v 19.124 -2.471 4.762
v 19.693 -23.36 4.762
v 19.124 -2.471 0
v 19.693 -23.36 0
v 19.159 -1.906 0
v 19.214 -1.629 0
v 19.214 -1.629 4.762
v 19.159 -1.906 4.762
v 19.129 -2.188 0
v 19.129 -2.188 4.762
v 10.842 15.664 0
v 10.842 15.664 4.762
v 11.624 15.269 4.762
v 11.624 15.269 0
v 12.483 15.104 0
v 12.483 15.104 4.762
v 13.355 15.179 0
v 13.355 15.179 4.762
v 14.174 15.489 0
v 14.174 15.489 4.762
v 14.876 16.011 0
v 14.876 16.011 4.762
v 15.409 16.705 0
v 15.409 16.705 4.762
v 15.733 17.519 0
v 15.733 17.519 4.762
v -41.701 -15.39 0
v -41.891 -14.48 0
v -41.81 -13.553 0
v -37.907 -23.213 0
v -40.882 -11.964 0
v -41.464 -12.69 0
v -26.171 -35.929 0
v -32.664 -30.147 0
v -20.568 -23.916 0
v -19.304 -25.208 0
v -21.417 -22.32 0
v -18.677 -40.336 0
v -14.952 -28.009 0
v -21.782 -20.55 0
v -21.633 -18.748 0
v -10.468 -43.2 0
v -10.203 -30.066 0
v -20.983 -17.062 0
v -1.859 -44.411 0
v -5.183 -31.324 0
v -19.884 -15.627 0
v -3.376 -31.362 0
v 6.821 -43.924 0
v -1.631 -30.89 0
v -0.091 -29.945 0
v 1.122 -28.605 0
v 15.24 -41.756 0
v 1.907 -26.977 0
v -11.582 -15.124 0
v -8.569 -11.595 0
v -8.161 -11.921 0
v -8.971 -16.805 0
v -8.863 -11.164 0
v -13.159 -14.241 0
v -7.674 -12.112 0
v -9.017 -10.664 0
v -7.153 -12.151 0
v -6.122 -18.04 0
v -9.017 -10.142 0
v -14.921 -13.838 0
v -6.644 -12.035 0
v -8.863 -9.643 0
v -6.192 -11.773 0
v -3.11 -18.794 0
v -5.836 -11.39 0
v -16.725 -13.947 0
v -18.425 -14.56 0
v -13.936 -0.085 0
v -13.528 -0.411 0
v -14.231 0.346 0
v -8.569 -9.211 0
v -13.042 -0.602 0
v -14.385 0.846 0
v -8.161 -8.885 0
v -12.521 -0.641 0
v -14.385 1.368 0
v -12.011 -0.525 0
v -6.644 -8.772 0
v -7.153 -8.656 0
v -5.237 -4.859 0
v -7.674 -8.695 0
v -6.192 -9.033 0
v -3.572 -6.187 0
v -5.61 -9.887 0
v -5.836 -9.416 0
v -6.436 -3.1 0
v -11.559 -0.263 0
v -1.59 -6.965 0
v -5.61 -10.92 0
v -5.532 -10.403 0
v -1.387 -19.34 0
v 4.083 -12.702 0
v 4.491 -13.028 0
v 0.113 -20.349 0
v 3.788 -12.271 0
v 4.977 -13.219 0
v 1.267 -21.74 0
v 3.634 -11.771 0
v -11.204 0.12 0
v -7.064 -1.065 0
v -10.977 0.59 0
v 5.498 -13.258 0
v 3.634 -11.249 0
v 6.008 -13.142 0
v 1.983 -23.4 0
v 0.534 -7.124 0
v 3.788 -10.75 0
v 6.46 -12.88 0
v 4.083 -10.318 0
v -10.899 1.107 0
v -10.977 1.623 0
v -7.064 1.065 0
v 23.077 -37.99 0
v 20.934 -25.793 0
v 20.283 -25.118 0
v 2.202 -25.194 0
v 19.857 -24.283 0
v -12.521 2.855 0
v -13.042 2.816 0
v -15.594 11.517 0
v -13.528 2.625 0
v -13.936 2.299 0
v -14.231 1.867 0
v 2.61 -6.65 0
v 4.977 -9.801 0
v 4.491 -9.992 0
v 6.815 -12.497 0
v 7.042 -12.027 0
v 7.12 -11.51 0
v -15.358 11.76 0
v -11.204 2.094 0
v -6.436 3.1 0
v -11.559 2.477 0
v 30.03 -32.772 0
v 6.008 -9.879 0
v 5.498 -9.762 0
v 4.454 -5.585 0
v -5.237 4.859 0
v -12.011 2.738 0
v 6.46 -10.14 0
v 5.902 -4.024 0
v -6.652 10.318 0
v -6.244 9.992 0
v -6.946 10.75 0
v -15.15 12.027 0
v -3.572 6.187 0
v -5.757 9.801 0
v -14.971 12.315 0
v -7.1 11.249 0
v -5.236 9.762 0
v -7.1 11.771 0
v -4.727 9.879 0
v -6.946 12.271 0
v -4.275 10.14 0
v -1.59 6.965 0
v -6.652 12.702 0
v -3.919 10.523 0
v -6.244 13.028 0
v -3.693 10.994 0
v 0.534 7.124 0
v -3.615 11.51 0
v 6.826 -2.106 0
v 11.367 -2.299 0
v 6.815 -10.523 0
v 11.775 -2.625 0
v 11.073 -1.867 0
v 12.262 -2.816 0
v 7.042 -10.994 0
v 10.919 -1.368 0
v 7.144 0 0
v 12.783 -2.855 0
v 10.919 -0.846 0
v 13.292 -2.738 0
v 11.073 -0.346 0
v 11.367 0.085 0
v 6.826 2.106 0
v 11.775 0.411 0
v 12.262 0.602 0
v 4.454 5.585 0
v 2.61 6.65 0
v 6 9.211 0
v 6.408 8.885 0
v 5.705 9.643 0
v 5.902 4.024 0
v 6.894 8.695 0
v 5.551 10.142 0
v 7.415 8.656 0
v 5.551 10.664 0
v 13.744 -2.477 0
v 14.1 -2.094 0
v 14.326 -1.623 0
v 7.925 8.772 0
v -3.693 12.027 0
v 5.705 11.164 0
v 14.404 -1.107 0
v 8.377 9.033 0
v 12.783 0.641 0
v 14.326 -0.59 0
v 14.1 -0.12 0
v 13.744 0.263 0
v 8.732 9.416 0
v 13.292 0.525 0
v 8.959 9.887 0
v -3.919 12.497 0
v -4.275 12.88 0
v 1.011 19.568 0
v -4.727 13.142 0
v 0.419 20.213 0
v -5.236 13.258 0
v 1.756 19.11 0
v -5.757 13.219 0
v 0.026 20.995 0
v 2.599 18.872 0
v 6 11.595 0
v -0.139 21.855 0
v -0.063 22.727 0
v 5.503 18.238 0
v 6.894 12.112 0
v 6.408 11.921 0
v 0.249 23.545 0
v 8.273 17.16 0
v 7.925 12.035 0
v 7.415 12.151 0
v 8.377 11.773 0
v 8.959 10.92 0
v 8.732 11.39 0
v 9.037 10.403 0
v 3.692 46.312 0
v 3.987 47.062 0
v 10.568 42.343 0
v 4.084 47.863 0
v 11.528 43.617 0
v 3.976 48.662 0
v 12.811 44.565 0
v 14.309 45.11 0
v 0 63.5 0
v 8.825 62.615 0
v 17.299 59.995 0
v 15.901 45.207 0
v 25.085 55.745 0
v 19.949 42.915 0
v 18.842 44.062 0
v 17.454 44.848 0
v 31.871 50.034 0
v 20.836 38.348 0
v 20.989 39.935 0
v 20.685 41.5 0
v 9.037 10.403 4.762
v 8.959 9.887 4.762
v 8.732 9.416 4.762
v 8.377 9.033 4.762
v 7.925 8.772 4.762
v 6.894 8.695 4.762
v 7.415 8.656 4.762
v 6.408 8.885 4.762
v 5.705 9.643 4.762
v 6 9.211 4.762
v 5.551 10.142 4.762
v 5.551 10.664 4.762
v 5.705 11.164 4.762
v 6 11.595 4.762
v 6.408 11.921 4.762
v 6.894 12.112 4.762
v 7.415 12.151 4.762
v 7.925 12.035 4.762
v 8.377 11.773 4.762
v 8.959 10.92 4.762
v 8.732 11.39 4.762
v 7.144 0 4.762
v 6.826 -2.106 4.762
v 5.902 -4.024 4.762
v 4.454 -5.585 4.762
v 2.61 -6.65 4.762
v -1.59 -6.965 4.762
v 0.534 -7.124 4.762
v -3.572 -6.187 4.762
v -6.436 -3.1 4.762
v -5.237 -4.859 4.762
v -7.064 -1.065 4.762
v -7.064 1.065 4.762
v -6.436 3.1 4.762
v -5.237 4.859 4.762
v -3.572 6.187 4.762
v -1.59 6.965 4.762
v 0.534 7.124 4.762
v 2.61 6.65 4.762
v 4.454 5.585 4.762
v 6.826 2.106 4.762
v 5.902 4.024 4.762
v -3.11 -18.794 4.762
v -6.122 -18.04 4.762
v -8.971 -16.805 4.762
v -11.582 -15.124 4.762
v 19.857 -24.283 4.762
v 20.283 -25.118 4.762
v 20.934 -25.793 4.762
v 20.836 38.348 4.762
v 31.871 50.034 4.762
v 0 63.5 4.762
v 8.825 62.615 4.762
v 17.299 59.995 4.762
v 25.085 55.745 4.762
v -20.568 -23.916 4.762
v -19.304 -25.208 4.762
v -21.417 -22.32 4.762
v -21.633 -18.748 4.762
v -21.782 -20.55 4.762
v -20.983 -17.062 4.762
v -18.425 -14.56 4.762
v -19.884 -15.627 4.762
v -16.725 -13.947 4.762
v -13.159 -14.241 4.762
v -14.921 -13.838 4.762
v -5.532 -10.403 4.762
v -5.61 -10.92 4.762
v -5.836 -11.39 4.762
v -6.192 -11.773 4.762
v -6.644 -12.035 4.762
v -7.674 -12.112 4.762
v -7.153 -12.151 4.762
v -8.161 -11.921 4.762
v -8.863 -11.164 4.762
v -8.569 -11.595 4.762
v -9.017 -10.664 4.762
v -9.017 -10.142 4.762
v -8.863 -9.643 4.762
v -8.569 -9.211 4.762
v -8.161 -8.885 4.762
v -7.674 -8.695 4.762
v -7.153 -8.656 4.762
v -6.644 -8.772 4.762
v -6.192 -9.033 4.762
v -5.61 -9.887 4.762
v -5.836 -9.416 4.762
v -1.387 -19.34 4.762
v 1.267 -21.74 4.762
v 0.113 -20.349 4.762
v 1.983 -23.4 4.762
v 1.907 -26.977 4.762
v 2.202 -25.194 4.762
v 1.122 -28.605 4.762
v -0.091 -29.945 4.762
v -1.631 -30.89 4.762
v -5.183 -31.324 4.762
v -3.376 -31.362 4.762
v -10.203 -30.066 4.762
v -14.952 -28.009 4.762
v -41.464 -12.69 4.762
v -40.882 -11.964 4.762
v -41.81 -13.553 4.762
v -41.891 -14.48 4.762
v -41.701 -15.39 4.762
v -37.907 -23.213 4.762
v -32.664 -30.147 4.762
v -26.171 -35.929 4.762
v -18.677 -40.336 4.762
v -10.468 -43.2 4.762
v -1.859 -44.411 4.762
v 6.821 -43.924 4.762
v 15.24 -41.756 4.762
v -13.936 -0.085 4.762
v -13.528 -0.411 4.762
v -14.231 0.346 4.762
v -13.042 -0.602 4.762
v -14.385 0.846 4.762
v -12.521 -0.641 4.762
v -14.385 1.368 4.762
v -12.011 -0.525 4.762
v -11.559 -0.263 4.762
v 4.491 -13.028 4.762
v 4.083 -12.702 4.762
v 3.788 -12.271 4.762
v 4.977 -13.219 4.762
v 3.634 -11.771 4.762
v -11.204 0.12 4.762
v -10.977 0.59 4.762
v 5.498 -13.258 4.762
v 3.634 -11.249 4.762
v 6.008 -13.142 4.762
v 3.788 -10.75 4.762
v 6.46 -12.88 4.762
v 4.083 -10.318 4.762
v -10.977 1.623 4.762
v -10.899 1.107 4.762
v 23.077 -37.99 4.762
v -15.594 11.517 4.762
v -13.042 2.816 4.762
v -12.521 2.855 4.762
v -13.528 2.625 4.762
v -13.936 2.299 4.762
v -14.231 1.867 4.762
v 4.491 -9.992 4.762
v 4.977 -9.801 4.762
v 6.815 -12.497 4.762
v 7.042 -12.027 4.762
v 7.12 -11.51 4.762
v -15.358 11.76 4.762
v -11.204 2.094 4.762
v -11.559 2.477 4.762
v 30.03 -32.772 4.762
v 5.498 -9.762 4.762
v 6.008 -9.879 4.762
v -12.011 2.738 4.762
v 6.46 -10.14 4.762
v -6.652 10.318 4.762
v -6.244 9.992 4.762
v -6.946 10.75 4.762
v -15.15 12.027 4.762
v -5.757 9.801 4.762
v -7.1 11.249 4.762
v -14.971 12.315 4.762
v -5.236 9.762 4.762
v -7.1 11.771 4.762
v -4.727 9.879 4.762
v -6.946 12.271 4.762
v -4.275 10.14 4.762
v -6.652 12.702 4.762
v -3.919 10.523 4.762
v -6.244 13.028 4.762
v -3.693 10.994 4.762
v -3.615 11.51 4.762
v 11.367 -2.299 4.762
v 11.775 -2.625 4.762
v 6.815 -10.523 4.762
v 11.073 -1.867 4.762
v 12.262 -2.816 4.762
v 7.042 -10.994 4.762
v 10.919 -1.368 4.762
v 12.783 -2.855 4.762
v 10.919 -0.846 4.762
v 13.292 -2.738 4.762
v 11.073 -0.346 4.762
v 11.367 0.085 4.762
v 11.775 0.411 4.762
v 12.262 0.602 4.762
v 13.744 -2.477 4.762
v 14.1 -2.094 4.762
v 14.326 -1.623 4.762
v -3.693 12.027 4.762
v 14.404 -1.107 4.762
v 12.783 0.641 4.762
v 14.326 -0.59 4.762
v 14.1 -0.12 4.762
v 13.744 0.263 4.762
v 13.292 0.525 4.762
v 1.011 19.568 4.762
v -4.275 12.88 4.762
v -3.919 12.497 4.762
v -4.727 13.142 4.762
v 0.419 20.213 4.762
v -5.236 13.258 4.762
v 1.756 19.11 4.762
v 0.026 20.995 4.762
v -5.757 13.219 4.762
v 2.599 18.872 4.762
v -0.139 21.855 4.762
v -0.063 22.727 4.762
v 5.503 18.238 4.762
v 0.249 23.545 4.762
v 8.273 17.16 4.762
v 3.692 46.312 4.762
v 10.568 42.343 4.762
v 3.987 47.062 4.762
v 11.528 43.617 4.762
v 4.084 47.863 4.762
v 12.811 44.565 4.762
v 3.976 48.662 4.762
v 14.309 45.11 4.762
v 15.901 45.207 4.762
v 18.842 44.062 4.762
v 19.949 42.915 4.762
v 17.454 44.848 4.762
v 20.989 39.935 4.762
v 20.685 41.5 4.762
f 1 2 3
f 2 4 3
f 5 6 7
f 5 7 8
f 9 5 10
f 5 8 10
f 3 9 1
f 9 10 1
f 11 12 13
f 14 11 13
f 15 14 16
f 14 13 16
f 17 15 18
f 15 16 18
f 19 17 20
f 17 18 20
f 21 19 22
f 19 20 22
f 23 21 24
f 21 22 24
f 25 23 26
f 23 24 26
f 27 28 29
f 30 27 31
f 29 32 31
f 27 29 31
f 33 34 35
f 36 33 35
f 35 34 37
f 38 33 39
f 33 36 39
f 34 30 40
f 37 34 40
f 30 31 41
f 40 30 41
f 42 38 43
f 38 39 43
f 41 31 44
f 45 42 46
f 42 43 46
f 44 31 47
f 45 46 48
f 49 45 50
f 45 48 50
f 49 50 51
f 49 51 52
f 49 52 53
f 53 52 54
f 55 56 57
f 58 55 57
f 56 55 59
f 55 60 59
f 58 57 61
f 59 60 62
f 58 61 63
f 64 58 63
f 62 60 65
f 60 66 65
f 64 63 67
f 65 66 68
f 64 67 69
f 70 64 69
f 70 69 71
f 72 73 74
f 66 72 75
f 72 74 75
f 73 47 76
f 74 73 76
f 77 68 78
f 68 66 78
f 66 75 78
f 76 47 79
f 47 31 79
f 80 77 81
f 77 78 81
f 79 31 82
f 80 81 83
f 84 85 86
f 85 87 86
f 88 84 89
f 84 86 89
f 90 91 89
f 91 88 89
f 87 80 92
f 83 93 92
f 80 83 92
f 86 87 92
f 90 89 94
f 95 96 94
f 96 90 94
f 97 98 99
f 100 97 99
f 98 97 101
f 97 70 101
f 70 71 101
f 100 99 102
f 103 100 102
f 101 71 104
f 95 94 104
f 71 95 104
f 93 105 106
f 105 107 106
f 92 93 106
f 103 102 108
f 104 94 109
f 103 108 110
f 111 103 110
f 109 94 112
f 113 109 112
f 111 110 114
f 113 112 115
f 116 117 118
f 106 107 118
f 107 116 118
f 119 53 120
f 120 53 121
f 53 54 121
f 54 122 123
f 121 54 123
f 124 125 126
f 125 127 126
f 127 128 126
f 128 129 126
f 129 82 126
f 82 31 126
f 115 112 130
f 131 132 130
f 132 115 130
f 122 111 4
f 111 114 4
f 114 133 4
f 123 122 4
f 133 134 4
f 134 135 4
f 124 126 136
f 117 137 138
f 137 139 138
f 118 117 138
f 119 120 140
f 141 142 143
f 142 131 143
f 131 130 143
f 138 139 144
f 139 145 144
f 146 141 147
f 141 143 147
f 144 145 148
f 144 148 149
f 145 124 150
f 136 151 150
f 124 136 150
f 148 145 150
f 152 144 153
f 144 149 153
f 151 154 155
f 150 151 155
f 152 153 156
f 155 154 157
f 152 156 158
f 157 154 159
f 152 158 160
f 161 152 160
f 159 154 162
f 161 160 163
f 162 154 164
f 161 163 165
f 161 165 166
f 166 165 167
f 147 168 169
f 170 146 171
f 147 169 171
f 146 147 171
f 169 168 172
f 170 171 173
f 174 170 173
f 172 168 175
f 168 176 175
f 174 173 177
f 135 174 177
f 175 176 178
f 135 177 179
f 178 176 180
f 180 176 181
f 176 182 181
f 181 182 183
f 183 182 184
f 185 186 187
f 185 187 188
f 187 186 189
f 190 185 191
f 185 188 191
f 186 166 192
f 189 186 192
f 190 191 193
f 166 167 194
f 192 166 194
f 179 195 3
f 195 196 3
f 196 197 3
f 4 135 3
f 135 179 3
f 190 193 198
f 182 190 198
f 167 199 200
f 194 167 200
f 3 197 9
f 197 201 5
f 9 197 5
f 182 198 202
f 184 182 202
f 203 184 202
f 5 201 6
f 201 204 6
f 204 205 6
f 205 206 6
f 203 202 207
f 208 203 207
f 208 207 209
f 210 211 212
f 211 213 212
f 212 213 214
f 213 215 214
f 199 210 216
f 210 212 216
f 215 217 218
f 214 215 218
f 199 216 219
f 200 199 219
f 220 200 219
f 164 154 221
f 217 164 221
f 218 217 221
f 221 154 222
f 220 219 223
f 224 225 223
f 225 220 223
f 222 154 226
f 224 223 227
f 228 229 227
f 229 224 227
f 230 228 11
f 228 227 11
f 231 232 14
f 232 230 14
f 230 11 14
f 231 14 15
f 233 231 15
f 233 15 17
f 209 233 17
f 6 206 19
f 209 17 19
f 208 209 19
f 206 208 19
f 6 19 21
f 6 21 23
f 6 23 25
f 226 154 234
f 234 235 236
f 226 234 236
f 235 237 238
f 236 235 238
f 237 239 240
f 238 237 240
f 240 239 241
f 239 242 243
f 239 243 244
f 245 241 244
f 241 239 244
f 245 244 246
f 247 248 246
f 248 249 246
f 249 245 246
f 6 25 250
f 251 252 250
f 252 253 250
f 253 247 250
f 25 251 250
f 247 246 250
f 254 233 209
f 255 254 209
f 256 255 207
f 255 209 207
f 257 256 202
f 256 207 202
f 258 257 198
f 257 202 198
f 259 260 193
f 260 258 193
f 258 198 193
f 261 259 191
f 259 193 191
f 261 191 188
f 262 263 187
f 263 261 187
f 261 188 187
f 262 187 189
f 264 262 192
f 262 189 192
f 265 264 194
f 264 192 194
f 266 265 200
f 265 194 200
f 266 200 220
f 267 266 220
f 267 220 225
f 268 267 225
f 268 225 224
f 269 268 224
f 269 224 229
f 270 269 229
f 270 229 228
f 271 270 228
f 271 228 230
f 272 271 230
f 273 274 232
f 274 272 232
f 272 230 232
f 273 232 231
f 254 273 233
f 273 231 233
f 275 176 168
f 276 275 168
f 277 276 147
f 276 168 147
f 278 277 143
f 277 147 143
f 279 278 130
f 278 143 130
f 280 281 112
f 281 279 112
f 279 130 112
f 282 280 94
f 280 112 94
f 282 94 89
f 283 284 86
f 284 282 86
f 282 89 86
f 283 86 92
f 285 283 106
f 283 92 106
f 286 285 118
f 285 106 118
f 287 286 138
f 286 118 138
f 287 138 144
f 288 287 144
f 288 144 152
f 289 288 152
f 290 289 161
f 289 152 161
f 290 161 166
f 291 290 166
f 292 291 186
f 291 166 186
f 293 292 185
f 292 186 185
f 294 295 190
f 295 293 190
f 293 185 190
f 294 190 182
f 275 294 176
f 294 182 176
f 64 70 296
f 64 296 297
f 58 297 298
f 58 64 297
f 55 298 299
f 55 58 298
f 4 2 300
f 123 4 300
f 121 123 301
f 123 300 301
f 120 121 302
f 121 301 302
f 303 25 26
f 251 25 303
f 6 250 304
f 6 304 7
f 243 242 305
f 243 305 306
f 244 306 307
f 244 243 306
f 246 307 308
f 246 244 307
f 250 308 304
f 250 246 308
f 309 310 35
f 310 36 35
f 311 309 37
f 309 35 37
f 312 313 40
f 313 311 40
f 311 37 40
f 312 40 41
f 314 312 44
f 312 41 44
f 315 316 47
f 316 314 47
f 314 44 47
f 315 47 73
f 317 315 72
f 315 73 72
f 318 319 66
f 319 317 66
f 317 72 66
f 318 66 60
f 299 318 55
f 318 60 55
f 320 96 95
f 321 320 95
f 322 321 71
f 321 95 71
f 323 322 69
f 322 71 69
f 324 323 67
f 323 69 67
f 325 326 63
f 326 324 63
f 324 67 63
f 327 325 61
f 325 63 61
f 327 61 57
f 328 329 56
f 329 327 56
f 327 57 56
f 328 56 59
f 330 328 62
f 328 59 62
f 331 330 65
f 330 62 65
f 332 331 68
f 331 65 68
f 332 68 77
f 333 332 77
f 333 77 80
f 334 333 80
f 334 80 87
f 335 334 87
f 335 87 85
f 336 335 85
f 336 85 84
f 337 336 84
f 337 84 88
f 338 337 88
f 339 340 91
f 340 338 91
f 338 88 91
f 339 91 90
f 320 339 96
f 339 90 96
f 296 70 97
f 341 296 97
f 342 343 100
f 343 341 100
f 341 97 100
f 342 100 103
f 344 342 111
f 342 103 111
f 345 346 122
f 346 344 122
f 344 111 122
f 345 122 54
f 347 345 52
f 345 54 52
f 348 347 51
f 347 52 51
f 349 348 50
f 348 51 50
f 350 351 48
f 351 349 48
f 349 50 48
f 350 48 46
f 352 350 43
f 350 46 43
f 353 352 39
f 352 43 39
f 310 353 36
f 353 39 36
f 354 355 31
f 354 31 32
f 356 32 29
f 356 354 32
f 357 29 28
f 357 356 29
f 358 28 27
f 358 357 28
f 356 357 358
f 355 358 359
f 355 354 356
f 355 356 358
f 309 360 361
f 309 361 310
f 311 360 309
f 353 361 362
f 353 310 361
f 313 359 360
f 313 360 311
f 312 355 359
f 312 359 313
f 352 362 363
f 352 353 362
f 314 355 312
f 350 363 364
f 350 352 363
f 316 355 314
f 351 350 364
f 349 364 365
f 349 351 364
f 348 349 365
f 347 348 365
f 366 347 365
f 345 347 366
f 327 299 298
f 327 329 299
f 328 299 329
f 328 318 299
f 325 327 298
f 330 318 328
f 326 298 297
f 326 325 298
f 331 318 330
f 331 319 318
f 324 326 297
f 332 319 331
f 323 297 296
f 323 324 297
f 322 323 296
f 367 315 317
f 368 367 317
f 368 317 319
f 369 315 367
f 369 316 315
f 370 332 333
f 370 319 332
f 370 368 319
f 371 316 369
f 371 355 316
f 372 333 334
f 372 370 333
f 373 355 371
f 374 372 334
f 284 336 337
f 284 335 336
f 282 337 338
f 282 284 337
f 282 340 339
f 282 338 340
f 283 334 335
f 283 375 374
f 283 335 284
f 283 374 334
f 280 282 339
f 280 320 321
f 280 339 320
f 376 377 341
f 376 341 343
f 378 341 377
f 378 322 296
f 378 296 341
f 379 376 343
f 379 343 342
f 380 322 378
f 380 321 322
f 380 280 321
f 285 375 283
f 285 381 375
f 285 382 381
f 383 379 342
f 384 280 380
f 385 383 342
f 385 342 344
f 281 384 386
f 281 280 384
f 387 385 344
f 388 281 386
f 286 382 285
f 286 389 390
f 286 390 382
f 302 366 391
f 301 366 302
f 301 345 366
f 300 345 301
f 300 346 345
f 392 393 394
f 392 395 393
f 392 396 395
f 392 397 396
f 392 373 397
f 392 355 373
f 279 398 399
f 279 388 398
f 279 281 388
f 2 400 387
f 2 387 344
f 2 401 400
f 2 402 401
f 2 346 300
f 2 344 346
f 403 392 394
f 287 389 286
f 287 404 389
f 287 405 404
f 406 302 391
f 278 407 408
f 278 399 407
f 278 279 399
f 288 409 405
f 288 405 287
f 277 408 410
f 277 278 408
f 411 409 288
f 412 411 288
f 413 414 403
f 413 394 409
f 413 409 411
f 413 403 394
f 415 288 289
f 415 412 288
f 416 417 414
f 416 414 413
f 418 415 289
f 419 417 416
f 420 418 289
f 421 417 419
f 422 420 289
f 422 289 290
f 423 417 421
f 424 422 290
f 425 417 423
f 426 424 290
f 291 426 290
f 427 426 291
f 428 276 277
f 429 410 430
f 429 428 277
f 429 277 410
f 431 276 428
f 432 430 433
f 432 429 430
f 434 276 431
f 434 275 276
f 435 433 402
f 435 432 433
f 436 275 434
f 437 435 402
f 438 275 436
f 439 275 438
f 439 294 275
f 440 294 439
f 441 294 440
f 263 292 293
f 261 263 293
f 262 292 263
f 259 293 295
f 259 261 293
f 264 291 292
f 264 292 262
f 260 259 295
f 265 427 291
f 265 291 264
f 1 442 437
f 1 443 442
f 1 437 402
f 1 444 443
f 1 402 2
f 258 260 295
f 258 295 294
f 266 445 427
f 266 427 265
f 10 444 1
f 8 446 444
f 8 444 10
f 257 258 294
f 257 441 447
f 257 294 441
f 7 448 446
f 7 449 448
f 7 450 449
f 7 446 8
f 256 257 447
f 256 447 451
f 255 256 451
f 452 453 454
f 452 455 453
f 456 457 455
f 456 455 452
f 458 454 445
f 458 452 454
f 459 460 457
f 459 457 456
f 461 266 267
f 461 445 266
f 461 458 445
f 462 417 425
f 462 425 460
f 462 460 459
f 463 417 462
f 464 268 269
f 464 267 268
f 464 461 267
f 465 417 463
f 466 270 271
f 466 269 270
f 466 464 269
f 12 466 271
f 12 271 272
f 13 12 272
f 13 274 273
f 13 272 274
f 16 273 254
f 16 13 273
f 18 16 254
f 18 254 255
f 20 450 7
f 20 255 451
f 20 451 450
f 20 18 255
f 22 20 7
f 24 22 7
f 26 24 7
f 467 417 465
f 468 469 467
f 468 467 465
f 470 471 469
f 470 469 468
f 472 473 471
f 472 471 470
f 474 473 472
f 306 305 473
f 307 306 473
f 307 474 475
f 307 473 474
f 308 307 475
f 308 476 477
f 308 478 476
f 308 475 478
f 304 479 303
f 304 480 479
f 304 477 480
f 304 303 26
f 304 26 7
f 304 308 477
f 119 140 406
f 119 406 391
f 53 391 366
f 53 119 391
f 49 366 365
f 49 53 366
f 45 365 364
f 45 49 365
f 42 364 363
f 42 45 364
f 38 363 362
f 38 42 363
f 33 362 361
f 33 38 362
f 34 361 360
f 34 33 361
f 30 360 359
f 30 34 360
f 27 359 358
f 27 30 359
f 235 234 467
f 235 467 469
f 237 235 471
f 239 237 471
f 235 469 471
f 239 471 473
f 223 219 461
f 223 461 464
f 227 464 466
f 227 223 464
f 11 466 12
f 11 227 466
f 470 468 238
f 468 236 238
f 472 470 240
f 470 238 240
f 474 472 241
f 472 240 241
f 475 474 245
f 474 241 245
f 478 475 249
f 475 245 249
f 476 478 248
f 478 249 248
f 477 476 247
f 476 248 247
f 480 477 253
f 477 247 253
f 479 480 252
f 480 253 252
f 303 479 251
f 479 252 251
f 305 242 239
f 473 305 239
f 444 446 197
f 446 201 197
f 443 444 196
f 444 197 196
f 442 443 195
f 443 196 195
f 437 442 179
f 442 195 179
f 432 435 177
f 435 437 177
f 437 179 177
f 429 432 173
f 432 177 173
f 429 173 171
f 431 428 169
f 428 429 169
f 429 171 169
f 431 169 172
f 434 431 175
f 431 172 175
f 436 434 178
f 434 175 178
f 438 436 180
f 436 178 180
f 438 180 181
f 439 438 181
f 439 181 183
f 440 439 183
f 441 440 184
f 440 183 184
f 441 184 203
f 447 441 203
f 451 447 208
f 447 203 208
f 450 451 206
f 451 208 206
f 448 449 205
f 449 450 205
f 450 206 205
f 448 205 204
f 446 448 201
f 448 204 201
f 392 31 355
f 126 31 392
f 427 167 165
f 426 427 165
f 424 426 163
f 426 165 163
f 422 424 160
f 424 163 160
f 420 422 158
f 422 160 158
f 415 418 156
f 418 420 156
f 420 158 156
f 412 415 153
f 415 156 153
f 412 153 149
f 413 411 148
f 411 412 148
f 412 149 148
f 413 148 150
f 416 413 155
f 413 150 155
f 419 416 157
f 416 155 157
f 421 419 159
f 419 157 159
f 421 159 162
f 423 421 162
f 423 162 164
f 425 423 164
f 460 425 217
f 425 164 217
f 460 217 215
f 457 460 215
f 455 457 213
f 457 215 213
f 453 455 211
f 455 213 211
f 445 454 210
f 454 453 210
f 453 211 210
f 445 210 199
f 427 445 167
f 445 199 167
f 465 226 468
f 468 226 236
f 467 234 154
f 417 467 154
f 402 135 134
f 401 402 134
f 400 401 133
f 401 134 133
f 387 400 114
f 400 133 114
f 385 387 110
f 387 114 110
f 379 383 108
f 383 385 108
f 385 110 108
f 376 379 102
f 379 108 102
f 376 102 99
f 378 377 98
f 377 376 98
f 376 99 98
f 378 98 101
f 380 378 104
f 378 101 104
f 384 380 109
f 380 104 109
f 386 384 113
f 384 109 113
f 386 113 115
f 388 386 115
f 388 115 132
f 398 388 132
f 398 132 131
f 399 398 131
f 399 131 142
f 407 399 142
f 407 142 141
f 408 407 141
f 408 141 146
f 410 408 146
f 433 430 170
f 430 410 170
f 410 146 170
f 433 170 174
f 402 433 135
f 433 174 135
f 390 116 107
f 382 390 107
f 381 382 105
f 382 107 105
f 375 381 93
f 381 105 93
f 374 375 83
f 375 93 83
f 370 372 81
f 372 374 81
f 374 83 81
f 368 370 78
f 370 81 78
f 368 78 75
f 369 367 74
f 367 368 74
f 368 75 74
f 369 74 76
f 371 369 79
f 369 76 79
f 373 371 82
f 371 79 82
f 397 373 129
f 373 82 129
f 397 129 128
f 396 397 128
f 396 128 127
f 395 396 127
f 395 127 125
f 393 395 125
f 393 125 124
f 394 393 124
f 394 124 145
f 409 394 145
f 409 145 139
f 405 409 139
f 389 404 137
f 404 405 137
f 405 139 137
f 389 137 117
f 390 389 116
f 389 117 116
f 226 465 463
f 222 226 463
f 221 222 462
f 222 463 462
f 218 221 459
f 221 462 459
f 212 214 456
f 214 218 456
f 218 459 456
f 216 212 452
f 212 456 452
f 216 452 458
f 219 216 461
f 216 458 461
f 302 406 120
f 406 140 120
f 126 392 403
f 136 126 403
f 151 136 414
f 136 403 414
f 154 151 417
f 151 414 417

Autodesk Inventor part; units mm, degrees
ref_plane "YZ Plane" through (0, 0, 0) normal (1, 0, 0) x (0, 1, 0)
ref_plane "XZ Plane" through (0, 0, 0) normal (0, 1, 0) x (-1, 0, 0)
ref_plane "XY Plane" through (0, 0, 0) normal (0, 0, 1) x (1, 0, 0)
sketch "Sketch1" plane through (0, 0, 0) normal (0, 0, 1) x (1, 0, 0)
  circle A0 centre (0, 0) radius 63.5 construction
  circle A1 centre (0, 0) radius 7.1437
  circle A2 centre (0, 0) radius 12.7 construction
  circle A3 centre (0, 0) radius 19.05
  line L0 (0, 63.5) -> (0, 0) construction
  line L1 (0, 63.5) -> (4.306, 47.4299)
  line L2 (4.306, 47.4299) -> (-16.6992, 9.1674)
  circle A4 centre (0, 0) radius 47.625 construction
  arc A5 (31.8711, 50.0344) -> (0, 63.5) centre (0, 19.05) ccw
  line L3 (31.8711, 50.0344) -> (18.5028, -4.533)
  circle A6 centre (0, 0) radius 44.45 construction
  line L4 (30.03, -32.772) -> (0, 0) construction
  line L5 (30.03, -32.772) -> (19.7345, -24.8719)
  line L6 (19.7345, -24.8719) -> (19.0429, 0.5186)
  circle A7 centre (0, 0) radius 31.75 construction
  arc A8 (-42.3927, -13.3664) -> (30.03, -32.772) centre (0, 0) ccw
  line L7 (-42.3927, -13.3664) -> (-12.9621, 13.9602)
  line L8 (-42.3927, -13.3664) -> (0, 0) construction
  line L9 (-2.2951, 18.9112) -> (10.5685, 42.3434)
  line L10 (14.4751, 12.3844) -> (20.8358, 38.3475)
  arc A9 (20.8358, 38.3475) -> (10.5685, 42.3434) centre (15.4391, 39.6696) ccw
  line L11 (-10.9985, 6.35) -> (0, 0) construction
  line L12 (0, 0) -> (-5.3673, 11.5101) construction
  circle A10 centre (-5.3673, 11.5101) radius 1.7526
  circle A11 centre (-12.6517, 1.1069) radius 1.7526
  circle A12 centre (-7.2844, -10.4032) radius 1.7526
  circle A13 centre (5.3673, -11.5101) radius 1.7526
  circle A14 centre (12.6517, -1.1069) radius 1.7526
  circle A15 centre (7.2844, 10.4032) radius 1.7526
  arc A16 (-15.4432, -20.166) -> (-4.1463, -25.0593) centre (0, 0) ccw construction
  arc A17 (-19.304, -25.2075) -> (-5.1829, -31.3241) centre (0, 0) ccw
  arc A18 (-11.5824, -15.1245) -> (-3.1097, -18.7945) centre (0, 0) ccw
  arc A19 (-11.5824, -15.1245) -> (-19.304, -25.2075) centre (-15.4432, -20.166) ccw
  arc A20 (-5.1829, -31.3241) -> (-3.1097, -18.7945) centre (-4.1463, -25.0593) ccw
  line L13 (-15.4432, -20.166) -> (0, 0) construction
  line L14 (-4.1463, -25.0593) -> (0, 0) construction
  line L15 (0, 0) -> (-10.0957, -23.3074) construction
  point P0 (19.1127, -2.0435)
  point P1 (-15.2178, 11.8657)
  point P2 (-3.1097, -18.7945)
  dimension "d0" = 127
  dimension "d8" = 38.1
  dimension "d14" = 15.875
  dimension "d17" = 63.5
  dimension "d1" = 14.2875
  dimension "d2" = 25.4
  dimension "d9" = 15
  dimension "d11" = 44.45
  dimension "d12" = 15
  dimension "d15" = 88.9
  dimension "d16" = 10
  dimension "d18" = 42.5
  dimension "d19" = 115
  dimension "d28" = 7.9375
  dimension "d29" = 7.9375
  dimension "d30" = 5.5563
  dimension "d31" = 35
  dimension "d32" = 3.5052
  dimension "d35" = 360
  dimension "d40" = 60
  dimension "d41" = 12.7
  dimension "d43" = 28.05
  dimension "d44" = 156.58
extrude "Extrusion1" add sketch "Sketch1" along normal blind 4.7625 contours A3 | A3 L6 L3 | A3 L10 A9 L9 L7 L2 L1 A5 L3 L6 | L3 L6 L5 A8 L7 L2 A3 A19 A17 A20 | A3 L2 L7
fillet "Fillet1" radius 3.175 6 edges at (19.1127, -2.0435, 2.3813) (19.7345, -24.8719, 2.3813) (4.306, 47.4299, 2.3813) (-2.2951, 18.9112, 2.3813) (14.4751, 12.3844, 2.3813) (-15.2178, 11.8657, 2.3813)
fillet "Fillet3" radius 3.175 1 edges at (-42.3927, -13.3664, 2.3813)
sketch "Sketch2" plane through (0, 0, 4.7625) normal (0, 0, 1) x (1, 0, 0)
  arc A0 (31.8711, 50.0344) -> (0, 63.5) centre (0, 19.05) ccw construction
  circle A1 centre (0, 0) radius 63.5 construction
equation "\"d29\" = d28"
properties part number "Blade" material "Steel, Alloy"
